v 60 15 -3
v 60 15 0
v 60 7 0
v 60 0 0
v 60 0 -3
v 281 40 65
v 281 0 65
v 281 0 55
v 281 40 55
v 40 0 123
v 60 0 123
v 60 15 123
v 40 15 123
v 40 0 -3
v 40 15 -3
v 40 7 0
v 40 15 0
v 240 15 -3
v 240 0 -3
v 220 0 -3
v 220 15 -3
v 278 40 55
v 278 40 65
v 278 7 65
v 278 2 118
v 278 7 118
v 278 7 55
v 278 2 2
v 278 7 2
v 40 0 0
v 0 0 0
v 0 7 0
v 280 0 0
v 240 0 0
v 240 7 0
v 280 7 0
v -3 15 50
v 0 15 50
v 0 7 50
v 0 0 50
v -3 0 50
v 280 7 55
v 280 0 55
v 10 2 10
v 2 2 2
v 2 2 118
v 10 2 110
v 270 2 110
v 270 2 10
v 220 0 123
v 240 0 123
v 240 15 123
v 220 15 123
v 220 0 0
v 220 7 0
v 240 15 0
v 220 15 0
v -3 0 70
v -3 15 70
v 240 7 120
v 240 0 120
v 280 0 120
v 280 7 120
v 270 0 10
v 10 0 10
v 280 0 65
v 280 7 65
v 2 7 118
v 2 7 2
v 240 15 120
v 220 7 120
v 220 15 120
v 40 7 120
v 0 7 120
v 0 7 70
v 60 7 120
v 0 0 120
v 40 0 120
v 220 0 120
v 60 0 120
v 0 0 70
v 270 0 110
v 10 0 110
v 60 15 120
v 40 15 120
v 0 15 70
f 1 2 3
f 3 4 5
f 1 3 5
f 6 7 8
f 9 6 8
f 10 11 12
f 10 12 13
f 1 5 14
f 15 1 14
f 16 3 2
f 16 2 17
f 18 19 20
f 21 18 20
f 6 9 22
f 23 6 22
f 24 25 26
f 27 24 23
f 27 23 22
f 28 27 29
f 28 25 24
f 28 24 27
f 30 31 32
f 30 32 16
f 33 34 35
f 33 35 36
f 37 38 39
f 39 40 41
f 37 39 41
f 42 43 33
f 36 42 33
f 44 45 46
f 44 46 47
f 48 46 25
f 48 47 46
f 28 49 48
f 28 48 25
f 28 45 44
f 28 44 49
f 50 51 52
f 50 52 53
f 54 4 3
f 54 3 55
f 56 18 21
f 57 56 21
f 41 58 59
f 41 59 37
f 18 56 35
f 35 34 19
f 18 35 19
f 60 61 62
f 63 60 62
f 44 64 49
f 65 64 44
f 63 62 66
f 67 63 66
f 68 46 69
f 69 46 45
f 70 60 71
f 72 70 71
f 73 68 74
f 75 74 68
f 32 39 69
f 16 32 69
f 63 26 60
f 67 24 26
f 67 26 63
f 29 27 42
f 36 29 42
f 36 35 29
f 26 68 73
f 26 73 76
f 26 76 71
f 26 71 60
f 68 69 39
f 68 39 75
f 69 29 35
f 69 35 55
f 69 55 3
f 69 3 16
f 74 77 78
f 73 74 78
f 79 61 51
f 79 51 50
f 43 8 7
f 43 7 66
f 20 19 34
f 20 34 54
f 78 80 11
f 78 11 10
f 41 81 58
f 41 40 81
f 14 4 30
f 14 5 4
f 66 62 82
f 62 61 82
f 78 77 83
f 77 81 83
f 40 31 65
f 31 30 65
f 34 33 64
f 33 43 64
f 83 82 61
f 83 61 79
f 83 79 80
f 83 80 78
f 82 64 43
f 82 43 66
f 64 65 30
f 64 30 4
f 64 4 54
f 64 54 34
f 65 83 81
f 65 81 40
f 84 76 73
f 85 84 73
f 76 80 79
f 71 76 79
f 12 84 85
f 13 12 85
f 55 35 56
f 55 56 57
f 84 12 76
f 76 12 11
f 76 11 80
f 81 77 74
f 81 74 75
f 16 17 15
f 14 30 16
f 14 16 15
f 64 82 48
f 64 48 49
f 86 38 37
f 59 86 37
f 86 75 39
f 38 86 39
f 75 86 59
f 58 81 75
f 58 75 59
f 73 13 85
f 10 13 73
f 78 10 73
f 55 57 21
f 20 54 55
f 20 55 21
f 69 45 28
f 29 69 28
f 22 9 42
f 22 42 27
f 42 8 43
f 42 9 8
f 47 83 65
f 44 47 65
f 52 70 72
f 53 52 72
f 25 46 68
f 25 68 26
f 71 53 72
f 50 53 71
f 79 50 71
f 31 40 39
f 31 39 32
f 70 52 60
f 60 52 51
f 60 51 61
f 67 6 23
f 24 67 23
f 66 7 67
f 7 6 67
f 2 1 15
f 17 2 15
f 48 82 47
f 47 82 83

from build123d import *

# Parameters (mm, degrees)
SKETCH1_W           = 280
SKETCH1_H           = 120
BOSS_EXTRUDE1_DEPTH = 2
SKETCH2_W           = 280
SKETCH2_H           = 120
SKETCH2_W_2         = 276
SKETCH2_H_2         = 116
BOSS_EXTRUDE2_DEPTH = 5
SKETCH4_W           = 20
SKETCH4_H           = 3
SKETCH4_W_2         = 3
SKETCH4_H_2         = 20
BOSS_EXTRUDE3_DEPTH = 15
SKETCH5_W           = 3
SKETCH5_H           = 10
BOSS_EXTRUDE4_DEPTH = 40
SKETCH6_W           = 260
SKETCH6_H           = 100
CUT_EXTRUDE2_DEPTH  = 41


with BuildPart() as part:
    # Sketch1 → Boss-Extrude1 (new body)
    with BuildSketch(Plane(origin=(0, 0, 0), x_dir=(1, 0, 0), z_dir=(0, 1, 0))):
        with Locations((140, -60)):
            Rectangle(SKETCH1_W, SKETCH1_H)
    extrude(amount=BOSS_EXTRUDE1_DEPTH)

    # Sketch2 → Boss-Extrude2 (add)
    with BuildSketch(Plane(origin=(0, 2, 0), x_dir=(1, 0, 0), z_dir=(0, 1, 0))):
        with Locations((140, -60)):
            Rectangle(SKETCH2_W, SKETCH2_H)
        with Locations((140, -60)):
            Rectangle(SKETCH2_W_2, SKETCH2_H_2, mode=Mode.SUBTRACT)
    extrude(amount=BOSS_EXTRUDE2_DEPTH)

    # Sketch4 → Boss-Extrude3 (add)
    with BuildSketch(Plane(origin=(0, 0, 0), x_dir=(-1, 0, 0), z_dir=(0, -1, 0))):
        with Locations((-50, 1.5)):
            Rectangle(SKETCH4_W, SKETCH4_H)
        with Locations((-230, 1.5)):
            Rectangle(SKETCH4_W, SKETCH4_H)
        with Locations((-230, -121.5)):
            Rectangle(SKETCH4_W, SKETCH4_H)
        with Locations((-50, -121.5)):
            Rectangle(SKETCH4_W, SKETCH4_H)
        with Locations((1.5, -60)):
            Rectangle(SKETCH4_W_2, SKETCH4_H_2)
    extrude(amount=-BOSS_EXTRUDE3_DEPTH)

    # Sketch5 → Boss-Extrude4 (add)
    with BuildSketch(Plane(origin=(0, 0, 0), x_dir=(-1, 0, 0), z_dir=(0, -1, 0))):
        with Locations((-279.5, -60)):
            Rectangle(SKETCH5_W, SKETCH5_H)
    extrude(amount=-BOSS_EXTRUDE4_DEPTH)

    # Sketch6 → Cut-Extrude2 (cut, through all)
    with BuildSketch(Plane(origin=(0, 0, 0), x_dir=(-1, 0, 0), z_dir=(0, -1, 0))):
        with Locations((-140, -60)):
            Rectangle(SKETCH6_W, SKETCH6_H)
    extrude(amount=-CUT_EXTRUDE2_DEPTH, mode=Mode.SUBTRACT)


solid = part.part
